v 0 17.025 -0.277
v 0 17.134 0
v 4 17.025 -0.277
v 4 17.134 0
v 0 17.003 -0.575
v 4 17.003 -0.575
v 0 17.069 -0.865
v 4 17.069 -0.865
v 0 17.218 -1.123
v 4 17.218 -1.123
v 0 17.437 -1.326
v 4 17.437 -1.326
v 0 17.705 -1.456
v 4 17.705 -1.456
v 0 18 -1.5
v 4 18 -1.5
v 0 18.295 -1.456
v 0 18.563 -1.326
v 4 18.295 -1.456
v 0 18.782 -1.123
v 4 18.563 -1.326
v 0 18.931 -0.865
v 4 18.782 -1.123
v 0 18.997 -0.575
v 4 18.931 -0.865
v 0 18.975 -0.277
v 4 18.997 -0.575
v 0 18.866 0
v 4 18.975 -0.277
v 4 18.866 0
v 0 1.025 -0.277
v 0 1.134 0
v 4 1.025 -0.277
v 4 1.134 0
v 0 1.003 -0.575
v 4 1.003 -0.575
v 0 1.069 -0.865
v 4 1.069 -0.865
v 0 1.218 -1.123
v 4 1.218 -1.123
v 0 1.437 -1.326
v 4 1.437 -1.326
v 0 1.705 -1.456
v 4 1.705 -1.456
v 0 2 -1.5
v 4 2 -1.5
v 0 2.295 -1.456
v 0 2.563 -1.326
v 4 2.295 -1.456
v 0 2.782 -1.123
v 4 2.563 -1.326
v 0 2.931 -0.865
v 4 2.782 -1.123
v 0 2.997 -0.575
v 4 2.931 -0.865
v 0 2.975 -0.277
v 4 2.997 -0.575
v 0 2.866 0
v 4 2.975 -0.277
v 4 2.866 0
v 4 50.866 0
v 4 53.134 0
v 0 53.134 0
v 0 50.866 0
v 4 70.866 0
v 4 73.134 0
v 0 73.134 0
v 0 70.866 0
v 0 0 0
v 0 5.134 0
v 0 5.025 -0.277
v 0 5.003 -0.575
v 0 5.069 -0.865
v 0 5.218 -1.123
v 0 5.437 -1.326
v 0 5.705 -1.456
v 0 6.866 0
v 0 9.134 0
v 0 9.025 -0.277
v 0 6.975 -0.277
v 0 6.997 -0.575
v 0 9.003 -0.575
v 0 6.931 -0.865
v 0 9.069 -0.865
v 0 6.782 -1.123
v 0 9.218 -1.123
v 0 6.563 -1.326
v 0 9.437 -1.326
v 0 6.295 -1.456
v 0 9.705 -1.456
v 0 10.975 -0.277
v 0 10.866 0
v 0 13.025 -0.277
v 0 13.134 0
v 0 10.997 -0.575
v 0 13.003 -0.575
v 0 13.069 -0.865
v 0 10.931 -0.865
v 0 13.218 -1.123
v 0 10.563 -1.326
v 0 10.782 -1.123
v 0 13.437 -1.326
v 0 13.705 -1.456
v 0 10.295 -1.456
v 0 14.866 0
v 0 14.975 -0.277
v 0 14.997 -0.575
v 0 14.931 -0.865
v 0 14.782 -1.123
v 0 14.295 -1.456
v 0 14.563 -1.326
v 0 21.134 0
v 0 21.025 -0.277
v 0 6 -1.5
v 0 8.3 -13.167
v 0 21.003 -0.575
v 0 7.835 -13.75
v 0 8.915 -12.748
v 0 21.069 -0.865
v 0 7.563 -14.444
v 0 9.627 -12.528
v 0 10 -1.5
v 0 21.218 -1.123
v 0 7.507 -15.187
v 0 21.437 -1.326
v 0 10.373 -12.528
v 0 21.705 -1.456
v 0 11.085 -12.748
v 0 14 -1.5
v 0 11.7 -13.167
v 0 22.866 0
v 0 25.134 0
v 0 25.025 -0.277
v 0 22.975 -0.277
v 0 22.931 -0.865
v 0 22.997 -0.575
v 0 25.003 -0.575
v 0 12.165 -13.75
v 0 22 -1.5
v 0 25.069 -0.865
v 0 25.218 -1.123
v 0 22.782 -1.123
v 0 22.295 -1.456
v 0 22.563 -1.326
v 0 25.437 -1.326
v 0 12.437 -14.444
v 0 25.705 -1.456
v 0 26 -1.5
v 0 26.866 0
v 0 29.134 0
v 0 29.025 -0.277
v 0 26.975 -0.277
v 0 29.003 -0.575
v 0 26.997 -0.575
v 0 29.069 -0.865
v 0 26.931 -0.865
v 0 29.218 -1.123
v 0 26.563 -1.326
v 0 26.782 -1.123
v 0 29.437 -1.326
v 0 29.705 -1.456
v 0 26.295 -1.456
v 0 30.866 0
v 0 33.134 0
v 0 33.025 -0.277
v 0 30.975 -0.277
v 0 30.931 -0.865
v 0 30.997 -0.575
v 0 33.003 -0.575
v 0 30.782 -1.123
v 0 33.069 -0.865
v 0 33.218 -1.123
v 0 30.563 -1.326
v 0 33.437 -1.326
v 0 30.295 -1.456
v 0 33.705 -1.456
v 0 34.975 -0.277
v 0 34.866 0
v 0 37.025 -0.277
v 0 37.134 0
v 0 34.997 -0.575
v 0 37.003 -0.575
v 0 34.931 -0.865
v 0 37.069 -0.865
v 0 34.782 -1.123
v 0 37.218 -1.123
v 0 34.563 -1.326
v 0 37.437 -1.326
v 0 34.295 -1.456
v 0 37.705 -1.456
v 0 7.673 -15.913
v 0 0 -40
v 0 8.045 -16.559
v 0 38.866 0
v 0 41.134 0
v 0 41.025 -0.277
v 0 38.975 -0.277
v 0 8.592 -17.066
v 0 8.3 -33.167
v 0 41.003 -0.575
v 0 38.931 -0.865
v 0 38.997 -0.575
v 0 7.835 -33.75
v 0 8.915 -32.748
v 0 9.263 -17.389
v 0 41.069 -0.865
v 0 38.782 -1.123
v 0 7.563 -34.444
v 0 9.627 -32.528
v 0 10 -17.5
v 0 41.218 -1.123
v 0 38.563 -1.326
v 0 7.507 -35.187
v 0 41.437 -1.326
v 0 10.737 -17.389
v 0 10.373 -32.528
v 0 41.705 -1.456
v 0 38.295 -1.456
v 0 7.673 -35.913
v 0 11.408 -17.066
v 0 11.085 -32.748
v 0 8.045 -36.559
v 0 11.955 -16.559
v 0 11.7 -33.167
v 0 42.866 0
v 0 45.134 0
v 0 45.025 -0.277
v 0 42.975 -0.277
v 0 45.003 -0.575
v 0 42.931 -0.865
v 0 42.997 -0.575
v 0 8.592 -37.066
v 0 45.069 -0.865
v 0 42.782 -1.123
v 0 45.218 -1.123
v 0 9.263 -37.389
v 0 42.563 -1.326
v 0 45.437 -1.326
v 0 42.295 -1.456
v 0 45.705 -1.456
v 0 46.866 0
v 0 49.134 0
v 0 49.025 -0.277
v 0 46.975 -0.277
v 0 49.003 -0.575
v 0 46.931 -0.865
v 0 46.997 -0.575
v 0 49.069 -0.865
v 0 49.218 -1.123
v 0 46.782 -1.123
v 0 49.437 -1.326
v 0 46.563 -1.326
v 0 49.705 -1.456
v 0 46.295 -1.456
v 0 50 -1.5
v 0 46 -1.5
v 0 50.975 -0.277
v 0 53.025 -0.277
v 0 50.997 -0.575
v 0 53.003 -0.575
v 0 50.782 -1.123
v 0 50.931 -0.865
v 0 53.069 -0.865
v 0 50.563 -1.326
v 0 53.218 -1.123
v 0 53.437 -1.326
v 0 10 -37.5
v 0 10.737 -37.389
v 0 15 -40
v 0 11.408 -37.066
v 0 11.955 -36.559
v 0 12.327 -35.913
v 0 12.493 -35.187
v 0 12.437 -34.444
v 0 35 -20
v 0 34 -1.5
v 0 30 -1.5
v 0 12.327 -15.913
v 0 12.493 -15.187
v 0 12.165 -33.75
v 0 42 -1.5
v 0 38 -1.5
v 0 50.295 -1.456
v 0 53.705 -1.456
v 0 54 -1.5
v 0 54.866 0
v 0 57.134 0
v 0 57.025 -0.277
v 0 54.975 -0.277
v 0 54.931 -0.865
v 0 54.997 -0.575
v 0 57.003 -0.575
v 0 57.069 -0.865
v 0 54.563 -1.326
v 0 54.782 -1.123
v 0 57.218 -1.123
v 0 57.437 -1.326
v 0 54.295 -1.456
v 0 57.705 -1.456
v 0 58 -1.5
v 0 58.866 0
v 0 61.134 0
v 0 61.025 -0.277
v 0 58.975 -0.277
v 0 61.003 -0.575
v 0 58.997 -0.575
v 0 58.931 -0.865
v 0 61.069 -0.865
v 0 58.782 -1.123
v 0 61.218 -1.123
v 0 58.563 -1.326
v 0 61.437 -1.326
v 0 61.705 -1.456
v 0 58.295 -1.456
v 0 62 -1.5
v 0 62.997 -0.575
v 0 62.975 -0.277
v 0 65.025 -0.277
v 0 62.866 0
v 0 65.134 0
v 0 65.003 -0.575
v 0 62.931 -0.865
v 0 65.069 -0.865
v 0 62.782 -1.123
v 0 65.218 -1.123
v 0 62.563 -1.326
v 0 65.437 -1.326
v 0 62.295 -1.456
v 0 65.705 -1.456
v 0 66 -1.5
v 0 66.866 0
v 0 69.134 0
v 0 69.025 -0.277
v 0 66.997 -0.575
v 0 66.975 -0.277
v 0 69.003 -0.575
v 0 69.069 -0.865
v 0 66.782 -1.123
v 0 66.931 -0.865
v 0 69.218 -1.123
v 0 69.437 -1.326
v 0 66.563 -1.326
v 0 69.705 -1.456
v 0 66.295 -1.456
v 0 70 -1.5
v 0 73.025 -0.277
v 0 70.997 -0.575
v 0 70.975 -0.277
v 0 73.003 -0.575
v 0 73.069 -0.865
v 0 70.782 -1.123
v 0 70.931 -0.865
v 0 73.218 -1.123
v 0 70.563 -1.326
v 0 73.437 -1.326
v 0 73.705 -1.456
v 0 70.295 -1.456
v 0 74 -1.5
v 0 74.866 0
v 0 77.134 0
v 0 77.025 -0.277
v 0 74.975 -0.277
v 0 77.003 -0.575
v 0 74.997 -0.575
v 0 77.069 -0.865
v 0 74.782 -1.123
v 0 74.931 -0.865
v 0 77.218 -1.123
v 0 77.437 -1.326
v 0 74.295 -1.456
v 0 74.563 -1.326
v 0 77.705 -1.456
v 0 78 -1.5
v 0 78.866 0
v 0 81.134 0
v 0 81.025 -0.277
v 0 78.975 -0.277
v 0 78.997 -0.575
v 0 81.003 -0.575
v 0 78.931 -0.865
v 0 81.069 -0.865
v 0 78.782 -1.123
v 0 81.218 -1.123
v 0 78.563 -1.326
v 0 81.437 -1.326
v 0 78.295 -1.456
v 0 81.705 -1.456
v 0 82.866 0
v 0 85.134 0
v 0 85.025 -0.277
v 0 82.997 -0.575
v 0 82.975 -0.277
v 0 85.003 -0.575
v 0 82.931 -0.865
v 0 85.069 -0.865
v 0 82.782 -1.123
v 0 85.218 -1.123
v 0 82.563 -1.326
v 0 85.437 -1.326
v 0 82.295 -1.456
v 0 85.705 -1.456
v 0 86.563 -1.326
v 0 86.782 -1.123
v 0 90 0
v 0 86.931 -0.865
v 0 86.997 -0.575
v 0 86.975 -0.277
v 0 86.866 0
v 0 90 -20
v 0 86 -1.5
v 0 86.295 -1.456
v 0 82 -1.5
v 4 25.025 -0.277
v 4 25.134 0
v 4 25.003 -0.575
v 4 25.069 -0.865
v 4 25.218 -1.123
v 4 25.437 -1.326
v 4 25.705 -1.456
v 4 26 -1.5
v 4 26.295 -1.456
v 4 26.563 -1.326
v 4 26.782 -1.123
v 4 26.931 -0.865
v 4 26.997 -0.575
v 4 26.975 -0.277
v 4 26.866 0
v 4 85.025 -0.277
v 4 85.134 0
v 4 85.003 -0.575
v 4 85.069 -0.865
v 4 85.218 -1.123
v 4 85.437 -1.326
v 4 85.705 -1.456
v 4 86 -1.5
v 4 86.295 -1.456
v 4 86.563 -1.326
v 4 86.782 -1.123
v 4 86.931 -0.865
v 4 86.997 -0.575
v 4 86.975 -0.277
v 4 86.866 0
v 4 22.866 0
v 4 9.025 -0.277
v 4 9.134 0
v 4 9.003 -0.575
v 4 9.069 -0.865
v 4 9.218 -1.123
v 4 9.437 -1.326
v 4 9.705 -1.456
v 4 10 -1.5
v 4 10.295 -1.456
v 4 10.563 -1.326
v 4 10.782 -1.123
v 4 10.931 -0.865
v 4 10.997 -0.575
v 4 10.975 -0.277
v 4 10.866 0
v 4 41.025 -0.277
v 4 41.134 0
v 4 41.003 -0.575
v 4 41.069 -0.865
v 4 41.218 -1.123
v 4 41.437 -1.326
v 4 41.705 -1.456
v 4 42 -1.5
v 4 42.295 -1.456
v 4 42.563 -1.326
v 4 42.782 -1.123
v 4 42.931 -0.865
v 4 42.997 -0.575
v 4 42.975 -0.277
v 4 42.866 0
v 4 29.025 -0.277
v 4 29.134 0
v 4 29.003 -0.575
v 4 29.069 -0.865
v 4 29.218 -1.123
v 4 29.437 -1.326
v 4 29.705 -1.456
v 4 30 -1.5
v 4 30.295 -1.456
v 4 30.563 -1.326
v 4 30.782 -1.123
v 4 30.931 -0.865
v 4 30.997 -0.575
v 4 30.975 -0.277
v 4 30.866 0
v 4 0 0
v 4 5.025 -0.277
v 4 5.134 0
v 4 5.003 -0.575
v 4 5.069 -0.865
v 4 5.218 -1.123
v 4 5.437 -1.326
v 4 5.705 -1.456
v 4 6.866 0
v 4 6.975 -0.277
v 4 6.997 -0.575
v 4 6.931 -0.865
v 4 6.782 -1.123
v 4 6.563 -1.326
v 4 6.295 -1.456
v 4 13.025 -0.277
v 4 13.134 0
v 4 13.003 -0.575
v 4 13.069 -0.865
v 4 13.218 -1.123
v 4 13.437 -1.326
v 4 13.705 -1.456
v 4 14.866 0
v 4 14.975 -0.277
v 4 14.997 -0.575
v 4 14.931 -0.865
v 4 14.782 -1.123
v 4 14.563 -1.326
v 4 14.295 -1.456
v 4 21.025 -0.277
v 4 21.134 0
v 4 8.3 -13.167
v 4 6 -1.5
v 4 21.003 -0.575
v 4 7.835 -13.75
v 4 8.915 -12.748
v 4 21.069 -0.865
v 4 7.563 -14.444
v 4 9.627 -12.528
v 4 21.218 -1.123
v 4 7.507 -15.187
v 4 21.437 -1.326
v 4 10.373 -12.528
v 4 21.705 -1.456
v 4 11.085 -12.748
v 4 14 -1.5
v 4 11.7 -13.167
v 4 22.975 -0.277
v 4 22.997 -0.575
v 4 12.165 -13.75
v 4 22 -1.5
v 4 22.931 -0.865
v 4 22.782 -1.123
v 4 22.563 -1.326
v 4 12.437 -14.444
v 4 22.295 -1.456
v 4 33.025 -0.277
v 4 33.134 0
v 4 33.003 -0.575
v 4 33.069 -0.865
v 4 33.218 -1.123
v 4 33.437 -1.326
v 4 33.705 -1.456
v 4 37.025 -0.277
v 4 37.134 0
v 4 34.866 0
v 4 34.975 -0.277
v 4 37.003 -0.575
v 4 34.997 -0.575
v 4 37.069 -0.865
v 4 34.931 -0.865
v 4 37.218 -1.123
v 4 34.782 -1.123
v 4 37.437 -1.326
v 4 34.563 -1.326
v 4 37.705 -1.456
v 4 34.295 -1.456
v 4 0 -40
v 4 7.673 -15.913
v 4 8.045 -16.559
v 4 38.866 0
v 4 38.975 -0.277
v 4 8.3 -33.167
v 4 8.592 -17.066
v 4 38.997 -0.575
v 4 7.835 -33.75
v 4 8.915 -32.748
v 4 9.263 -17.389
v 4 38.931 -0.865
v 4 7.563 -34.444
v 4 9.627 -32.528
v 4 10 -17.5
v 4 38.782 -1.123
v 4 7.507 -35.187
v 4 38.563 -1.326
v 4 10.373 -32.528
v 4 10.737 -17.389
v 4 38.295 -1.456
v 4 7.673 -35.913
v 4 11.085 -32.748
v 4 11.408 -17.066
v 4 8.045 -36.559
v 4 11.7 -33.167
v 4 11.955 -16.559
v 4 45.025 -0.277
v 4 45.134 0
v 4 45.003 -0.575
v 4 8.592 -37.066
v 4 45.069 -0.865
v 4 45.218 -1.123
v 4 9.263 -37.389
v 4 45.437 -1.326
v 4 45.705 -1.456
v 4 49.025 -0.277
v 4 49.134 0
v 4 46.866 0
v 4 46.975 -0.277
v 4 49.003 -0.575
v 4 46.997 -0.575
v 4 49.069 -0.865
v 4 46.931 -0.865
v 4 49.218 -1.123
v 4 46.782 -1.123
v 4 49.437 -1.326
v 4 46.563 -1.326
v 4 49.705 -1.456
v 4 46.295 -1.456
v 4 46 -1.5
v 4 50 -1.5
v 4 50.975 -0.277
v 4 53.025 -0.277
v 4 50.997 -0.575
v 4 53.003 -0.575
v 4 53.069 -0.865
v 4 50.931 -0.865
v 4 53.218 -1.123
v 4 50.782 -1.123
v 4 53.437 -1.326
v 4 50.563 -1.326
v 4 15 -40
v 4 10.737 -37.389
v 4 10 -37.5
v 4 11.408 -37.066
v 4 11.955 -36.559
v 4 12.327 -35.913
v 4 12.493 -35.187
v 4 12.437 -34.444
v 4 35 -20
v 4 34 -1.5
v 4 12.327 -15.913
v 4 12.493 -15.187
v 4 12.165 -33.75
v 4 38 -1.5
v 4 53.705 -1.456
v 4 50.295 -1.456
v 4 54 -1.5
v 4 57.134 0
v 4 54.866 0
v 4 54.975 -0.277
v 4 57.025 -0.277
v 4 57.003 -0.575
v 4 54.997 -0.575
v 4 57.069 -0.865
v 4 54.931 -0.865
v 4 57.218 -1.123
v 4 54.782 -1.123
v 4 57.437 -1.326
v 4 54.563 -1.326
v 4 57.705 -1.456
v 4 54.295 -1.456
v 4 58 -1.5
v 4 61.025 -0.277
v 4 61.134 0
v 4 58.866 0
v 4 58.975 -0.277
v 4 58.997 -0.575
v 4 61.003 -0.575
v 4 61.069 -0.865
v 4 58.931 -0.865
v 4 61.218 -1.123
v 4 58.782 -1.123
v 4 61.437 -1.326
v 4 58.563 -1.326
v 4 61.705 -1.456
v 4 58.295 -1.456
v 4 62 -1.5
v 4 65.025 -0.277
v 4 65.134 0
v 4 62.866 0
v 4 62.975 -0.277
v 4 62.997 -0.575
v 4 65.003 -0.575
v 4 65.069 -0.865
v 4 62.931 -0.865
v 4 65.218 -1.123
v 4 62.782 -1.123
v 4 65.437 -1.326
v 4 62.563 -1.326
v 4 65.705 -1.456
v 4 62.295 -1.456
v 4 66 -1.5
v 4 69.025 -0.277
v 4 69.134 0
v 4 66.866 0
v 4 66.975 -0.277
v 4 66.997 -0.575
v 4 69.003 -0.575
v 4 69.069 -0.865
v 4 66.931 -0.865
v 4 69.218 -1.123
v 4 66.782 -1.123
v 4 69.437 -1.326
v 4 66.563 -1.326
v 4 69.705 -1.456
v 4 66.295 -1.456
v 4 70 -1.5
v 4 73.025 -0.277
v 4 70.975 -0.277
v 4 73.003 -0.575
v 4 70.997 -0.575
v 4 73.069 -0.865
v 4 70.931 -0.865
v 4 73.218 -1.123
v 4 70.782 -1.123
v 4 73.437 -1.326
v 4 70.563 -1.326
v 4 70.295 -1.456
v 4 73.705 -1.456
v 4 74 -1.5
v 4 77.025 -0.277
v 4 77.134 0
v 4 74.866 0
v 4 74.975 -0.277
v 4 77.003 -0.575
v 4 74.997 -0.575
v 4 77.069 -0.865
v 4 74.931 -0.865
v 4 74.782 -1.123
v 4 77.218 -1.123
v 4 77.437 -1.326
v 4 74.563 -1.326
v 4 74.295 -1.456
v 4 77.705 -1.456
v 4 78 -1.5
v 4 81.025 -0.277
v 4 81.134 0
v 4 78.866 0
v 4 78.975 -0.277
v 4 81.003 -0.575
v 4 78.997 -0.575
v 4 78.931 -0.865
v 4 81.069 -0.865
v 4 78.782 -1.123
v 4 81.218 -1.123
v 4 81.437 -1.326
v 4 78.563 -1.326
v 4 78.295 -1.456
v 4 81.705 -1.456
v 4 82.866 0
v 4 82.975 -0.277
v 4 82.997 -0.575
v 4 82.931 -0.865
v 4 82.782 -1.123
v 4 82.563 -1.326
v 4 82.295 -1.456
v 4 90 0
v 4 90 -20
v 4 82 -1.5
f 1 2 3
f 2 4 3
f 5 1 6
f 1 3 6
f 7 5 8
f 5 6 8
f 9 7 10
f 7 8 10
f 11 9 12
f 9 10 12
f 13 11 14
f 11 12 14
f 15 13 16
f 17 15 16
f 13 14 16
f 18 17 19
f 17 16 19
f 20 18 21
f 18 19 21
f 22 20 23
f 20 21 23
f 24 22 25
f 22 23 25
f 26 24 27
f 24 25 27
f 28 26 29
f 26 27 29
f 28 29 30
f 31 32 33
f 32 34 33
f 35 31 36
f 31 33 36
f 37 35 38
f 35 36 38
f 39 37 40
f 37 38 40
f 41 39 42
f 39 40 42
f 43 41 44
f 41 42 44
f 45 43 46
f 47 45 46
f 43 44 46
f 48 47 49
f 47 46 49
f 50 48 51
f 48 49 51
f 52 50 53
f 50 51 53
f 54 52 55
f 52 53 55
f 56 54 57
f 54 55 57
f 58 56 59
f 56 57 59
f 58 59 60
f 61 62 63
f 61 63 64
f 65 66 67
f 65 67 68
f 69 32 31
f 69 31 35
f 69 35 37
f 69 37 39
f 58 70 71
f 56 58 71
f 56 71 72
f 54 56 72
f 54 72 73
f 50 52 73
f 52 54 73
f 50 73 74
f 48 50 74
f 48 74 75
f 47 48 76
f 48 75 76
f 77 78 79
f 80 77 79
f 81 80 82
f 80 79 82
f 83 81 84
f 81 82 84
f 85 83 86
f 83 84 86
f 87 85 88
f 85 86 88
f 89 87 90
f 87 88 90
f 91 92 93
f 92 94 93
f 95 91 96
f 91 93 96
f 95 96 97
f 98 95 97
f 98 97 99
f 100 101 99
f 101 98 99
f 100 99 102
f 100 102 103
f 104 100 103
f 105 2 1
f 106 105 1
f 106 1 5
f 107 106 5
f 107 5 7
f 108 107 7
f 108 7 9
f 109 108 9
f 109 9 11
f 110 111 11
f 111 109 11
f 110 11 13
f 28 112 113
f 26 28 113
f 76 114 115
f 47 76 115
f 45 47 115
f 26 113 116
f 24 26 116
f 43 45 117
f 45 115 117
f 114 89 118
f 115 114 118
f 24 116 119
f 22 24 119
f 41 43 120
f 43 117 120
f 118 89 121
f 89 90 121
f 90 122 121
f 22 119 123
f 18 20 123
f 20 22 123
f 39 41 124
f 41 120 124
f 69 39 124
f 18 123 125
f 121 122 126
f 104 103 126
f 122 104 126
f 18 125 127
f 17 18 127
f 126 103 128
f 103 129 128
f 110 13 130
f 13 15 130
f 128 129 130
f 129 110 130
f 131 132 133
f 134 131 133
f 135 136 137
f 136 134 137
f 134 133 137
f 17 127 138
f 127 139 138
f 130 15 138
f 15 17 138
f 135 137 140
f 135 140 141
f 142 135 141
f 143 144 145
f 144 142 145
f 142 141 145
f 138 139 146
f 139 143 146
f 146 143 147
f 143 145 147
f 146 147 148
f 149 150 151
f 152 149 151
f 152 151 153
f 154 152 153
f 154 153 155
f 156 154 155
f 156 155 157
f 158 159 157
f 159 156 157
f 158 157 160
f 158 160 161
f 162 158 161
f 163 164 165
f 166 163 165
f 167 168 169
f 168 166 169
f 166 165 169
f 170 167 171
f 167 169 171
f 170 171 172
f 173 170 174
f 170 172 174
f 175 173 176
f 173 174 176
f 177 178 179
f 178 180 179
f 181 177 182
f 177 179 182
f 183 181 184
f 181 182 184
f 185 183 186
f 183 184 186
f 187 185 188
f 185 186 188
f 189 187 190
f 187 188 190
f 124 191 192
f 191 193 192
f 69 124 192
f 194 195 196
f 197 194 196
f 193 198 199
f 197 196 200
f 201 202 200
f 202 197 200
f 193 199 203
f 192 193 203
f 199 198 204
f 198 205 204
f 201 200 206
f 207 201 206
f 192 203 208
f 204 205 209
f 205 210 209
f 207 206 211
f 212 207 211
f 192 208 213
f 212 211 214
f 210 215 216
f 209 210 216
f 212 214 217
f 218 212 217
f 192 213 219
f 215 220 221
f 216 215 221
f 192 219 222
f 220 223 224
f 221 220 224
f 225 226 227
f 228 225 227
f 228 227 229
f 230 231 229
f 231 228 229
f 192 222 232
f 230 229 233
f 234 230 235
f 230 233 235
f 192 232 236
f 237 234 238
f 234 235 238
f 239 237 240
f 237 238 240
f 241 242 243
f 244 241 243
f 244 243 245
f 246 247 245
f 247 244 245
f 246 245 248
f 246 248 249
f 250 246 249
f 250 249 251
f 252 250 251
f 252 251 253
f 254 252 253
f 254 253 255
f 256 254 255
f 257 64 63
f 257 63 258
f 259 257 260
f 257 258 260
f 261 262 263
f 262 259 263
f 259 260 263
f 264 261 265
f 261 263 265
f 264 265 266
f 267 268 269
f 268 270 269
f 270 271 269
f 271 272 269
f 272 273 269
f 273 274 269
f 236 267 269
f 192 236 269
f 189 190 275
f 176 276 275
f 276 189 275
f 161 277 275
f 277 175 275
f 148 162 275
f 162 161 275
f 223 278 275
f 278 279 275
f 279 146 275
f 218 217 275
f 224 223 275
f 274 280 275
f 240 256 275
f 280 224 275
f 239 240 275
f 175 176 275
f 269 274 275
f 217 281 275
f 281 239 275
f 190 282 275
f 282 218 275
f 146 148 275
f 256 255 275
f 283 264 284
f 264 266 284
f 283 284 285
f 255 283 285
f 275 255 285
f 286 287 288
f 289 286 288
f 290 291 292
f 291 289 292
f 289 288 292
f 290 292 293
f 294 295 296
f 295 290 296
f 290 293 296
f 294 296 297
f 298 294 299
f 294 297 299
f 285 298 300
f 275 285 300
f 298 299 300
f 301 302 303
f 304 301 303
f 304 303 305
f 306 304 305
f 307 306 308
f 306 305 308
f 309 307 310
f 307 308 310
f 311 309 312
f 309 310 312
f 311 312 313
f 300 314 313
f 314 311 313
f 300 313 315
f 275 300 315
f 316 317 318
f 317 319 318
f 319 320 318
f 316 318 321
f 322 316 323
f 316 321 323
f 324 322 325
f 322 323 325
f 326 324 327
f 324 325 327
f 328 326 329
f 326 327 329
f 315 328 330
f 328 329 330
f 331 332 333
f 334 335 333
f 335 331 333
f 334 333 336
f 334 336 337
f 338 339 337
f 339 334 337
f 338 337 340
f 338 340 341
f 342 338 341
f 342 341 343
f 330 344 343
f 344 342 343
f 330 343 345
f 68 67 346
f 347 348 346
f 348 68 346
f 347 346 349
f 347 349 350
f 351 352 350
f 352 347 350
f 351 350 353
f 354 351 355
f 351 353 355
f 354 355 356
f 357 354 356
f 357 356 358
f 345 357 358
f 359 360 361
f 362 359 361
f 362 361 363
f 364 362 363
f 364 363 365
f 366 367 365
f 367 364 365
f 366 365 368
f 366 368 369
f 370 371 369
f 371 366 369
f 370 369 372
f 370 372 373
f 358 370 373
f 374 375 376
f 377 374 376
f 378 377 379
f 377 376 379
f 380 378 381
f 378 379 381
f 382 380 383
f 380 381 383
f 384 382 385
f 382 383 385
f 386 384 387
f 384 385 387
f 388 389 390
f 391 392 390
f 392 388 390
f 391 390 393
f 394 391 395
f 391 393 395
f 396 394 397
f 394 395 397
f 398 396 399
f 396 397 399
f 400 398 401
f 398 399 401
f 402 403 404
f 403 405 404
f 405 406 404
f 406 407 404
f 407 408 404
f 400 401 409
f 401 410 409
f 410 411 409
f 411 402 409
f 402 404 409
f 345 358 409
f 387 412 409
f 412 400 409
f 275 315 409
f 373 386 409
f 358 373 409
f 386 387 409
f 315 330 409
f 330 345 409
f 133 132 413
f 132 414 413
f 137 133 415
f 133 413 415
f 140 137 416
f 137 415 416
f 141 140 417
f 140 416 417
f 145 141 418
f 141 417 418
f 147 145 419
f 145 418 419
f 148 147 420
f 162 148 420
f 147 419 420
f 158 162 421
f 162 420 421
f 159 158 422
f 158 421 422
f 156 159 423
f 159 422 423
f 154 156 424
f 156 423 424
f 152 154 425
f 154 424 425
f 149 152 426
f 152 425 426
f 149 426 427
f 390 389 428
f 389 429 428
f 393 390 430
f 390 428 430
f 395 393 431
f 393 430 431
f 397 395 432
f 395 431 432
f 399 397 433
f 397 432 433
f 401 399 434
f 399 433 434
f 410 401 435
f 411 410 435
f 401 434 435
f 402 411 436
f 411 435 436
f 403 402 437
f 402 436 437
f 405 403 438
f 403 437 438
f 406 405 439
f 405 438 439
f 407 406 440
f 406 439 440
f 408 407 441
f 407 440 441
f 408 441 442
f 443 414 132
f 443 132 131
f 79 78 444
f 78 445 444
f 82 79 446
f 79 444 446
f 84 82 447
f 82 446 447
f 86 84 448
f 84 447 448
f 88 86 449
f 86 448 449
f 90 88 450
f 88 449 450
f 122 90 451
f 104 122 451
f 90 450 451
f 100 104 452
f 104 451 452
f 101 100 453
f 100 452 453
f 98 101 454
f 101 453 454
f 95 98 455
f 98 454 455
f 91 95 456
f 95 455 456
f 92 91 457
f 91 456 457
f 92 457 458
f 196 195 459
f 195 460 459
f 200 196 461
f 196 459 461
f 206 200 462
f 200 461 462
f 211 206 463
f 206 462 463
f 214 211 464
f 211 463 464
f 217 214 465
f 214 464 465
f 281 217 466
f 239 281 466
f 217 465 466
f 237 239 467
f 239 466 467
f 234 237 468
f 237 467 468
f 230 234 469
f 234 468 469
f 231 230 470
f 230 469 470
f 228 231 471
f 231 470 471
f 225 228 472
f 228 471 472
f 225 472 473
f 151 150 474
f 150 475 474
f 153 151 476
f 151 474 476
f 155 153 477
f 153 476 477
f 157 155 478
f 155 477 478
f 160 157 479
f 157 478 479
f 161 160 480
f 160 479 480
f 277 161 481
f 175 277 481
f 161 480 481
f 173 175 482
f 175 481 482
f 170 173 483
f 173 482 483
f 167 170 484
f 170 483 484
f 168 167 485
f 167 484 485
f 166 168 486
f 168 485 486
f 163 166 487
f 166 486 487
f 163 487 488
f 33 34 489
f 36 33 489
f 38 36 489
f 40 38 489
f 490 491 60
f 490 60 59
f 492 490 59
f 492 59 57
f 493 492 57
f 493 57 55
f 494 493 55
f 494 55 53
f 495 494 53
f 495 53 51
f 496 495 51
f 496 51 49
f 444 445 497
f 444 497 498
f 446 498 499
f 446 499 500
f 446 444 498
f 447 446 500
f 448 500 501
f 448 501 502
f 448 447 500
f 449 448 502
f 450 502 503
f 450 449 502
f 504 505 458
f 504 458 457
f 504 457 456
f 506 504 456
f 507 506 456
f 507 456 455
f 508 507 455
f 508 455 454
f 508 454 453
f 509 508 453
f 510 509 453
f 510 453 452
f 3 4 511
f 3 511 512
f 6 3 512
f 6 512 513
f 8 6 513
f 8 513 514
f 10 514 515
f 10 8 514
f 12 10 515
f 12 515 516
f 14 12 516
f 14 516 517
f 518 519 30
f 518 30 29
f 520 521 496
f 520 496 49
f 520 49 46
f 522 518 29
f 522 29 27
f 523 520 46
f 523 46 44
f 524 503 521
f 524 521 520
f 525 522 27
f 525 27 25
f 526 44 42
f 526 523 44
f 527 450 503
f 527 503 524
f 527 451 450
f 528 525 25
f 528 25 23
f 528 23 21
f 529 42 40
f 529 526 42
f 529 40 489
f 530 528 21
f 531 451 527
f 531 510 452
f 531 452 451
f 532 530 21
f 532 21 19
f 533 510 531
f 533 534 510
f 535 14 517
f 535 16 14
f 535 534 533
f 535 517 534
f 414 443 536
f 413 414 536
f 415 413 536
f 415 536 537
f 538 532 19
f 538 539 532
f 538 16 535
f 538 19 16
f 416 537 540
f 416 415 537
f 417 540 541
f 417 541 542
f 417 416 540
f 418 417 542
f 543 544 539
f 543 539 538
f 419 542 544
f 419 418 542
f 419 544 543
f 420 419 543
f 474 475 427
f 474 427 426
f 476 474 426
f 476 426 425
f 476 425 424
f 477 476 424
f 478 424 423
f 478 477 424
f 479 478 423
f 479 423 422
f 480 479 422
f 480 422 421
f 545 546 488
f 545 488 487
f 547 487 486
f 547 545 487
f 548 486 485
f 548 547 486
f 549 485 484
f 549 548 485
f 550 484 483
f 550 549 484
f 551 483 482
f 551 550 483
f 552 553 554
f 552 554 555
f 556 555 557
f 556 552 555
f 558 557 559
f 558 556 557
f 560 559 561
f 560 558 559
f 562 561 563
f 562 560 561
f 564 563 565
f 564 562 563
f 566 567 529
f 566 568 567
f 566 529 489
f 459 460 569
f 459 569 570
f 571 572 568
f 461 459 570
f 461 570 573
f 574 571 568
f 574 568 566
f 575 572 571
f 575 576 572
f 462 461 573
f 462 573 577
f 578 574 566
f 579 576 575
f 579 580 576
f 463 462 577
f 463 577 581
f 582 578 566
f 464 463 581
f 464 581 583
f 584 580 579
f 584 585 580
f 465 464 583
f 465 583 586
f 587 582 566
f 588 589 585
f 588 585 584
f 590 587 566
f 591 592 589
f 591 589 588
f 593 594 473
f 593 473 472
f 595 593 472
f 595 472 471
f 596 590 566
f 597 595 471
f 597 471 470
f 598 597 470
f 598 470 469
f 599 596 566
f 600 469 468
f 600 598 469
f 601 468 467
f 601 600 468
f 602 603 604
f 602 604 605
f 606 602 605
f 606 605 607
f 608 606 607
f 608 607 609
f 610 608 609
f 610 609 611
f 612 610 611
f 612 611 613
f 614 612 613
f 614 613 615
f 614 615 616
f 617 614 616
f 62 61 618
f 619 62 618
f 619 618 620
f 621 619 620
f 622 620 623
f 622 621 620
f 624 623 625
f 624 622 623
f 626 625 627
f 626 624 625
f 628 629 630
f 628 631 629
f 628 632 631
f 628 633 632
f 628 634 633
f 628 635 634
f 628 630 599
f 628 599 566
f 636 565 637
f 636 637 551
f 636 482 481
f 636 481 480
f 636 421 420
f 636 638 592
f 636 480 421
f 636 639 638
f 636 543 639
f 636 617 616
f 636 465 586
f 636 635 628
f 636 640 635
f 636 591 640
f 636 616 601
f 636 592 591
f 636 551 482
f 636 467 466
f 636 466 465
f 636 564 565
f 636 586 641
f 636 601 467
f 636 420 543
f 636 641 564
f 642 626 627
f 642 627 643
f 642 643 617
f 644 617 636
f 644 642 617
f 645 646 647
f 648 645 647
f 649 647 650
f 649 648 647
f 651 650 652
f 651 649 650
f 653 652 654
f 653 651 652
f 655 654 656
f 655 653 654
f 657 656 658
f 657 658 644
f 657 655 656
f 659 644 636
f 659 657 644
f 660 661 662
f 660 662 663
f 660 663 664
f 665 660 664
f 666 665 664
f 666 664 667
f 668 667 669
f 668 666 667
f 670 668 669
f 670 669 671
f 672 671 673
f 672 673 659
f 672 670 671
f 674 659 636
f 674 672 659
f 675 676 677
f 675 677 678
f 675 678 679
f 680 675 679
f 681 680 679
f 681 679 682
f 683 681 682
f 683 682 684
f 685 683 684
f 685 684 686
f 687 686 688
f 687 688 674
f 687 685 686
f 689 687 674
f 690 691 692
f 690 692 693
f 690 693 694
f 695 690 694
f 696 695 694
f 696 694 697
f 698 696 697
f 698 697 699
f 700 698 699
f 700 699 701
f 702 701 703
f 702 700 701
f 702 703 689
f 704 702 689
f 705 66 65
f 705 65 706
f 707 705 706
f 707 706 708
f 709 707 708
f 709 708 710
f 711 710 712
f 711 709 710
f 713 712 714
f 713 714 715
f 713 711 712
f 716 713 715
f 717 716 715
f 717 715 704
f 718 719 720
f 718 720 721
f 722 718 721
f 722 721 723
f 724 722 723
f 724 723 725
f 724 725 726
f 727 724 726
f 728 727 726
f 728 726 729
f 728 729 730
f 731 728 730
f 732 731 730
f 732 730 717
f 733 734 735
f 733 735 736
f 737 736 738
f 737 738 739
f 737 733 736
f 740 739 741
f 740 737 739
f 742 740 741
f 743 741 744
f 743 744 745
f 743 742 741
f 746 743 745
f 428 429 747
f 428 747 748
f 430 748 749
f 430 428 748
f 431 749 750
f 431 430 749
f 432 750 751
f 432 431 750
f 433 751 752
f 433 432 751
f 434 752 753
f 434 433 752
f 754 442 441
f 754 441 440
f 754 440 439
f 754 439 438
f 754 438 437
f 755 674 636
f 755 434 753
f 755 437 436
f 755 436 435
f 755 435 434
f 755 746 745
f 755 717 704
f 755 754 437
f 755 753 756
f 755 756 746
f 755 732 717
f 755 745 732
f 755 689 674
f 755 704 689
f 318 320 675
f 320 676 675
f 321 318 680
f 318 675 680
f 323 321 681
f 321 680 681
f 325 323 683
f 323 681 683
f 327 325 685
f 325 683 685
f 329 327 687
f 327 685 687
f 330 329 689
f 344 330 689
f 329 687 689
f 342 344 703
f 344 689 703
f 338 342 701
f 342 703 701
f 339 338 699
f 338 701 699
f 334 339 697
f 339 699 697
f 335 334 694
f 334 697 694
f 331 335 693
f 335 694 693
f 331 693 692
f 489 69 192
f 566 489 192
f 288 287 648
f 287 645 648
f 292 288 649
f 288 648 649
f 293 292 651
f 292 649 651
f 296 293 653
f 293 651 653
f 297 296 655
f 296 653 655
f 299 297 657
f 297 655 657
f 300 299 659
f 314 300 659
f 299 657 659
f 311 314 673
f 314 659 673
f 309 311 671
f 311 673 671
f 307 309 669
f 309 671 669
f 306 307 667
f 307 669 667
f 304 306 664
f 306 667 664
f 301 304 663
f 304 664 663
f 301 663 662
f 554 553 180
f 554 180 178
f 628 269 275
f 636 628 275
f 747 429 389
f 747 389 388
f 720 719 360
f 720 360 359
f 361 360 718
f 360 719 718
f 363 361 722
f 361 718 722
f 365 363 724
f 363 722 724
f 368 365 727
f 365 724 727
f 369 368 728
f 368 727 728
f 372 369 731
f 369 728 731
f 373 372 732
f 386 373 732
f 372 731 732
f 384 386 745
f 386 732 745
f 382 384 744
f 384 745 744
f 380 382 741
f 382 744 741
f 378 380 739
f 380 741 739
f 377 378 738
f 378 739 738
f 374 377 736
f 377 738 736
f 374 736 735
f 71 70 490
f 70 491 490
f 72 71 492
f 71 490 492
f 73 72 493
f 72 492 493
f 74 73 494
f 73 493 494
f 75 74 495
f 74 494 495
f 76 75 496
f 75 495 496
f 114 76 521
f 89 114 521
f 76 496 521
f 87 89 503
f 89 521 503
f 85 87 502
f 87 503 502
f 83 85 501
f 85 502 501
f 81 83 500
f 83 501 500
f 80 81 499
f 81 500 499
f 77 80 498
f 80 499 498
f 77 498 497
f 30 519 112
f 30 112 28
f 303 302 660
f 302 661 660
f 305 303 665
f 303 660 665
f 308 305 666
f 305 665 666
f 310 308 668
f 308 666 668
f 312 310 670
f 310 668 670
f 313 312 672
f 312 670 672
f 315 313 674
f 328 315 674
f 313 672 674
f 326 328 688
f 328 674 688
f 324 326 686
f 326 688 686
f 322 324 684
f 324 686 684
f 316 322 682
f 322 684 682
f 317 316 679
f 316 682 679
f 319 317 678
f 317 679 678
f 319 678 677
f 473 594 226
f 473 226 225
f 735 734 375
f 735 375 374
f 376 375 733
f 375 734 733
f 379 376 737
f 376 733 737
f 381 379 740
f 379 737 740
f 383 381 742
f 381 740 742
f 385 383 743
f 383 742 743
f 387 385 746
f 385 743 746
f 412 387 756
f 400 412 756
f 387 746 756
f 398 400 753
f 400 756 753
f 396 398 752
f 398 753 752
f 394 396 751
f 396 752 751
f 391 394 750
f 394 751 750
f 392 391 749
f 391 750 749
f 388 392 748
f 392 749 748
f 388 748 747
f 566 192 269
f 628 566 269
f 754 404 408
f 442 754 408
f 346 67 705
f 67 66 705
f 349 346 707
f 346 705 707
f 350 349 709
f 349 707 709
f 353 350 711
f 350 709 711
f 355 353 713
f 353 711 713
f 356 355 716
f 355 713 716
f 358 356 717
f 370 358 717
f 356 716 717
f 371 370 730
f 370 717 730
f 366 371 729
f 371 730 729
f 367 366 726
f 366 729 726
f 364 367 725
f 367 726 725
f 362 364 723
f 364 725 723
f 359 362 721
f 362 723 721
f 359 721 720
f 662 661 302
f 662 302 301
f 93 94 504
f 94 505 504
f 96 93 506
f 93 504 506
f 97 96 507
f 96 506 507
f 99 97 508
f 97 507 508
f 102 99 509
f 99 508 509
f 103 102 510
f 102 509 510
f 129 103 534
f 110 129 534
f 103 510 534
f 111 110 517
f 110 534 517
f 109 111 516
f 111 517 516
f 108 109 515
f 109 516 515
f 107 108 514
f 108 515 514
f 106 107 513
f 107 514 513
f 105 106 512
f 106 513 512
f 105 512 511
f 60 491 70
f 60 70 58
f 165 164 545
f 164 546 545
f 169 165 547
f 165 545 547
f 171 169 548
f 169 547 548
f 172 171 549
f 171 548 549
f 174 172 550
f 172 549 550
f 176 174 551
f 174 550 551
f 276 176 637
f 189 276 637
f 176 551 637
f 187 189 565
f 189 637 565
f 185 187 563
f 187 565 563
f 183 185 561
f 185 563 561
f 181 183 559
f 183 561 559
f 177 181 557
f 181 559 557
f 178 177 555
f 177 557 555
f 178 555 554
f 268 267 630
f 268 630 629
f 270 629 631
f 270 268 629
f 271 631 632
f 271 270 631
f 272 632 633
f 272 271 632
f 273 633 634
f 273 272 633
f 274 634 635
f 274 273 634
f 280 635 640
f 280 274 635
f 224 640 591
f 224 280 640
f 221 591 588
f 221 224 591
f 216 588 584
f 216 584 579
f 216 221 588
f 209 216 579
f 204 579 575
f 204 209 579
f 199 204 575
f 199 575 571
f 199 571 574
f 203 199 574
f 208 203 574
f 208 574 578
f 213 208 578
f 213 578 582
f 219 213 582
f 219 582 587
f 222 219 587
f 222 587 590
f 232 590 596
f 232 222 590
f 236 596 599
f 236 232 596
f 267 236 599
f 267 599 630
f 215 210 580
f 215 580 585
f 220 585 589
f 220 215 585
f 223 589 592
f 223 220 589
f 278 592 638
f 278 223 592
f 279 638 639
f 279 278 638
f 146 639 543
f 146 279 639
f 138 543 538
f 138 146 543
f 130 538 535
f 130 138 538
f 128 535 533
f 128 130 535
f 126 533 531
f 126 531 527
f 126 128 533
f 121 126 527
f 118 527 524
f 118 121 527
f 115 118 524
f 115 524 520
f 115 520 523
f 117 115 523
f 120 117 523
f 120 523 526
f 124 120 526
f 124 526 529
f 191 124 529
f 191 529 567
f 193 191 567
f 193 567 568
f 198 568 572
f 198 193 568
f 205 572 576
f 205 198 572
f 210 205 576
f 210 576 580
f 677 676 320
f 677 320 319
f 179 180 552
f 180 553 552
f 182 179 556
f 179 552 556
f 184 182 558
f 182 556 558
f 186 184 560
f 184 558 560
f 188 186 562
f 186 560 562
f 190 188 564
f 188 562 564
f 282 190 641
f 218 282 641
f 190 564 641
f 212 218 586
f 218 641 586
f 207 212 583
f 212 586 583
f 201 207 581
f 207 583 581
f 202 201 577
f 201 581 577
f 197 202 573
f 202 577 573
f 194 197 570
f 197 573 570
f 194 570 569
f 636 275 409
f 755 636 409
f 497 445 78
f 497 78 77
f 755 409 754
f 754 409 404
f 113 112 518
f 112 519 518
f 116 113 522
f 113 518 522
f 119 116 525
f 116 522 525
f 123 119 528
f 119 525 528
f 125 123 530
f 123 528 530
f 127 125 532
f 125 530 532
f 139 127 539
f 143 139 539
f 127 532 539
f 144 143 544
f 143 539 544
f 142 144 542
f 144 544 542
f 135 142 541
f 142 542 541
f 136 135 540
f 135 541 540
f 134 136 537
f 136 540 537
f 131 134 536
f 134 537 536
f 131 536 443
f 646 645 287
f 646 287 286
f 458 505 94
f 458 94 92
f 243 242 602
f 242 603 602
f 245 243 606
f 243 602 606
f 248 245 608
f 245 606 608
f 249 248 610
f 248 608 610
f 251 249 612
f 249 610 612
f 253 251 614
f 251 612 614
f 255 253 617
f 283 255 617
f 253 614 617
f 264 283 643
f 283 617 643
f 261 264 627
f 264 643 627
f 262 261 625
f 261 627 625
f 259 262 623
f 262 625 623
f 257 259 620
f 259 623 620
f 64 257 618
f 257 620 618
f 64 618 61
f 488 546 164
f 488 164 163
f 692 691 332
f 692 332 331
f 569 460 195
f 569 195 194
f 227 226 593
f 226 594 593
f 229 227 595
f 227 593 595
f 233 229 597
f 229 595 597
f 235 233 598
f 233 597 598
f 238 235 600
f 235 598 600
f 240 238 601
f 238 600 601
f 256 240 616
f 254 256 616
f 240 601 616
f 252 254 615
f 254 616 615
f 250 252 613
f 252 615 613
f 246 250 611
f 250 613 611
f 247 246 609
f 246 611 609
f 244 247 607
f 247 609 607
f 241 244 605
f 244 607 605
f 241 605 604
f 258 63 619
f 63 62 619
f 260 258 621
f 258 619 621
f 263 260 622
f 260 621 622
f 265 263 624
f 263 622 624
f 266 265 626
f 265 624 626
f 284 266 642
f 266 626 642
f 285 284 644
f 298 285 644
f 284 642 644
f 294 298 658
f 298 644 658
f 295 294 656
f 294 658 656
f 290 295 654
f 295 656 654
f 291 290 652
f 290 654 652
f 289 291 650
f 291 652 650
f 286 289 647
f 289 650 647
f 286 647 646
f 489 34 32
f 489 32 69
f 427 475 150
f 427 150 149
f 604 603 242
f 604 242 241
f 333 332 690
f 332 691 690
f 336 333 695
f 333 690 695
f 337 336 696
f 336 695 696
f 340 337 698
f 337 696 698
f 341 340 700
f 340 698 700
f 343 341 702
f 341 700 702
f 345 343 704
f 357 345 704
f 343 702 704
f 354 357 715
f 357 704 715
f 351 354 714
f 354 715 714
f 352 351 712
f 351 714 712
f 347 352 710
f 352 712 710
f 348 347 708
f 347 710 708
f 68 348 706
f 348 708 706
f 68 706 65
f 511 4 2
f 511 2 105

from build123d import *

# Parameters (mm, degrees)
SKETCH_1_R          = 2.5
EXTRUDE_1_DEPTH     = 4
SKETCH_2_R          = 1
CUT_EXTRUDE_1_DEPTH = 10


with BuildPart() as part:
    # Эскиз1 → Бобышка-Вытянуть1 (new body)
    with BuildSketch(Plane(origin=(0, 0, 0), x_dir=(0, 0, -1), z_dir=(1, 0, 0))):
        Polygon((40, 15), (20, 35), (20, 90), (0, 90), (0, 0), (40, 0), align=None)
        with Locations((15, 10)):
            Circle(SKETCH_1_R, mode=Mode.SUBTRACT)
        with Locations((35, 10)):
            Circle(SKETCH_1_R, mode=Mode.SUBTRACT)
    extrude(amount=EXTRUDE_1_DEPTH)

    # Эскиз2 → Вырез-Вытянуть1 (cut)
    with BuildSketch(Plane(origin=(4, 0, 0), x_dir=(0, 0, -1), z_dir=(1, 0, 0))):
        with Locations((0.5, 2)):
            Circle(SKETCH_2_R)
        with Locations((0.5, 6)):
            Circle(SKETCH_2_R)
        with Locations((0.5, 10)):
            Circle(SKETCH_2_R)
        with Locations((0.5, 14)):
            Circle(SKETCH_2_R)
        with Locations((0.5, 18)):
            Circle(SKETCH_2_R)
        with Locations((0.5, 22)):
            Circle(SKETCH_2_R)
        with Locations((0.5, 26)):
            Circle(SKETCH_2_R)
        with Locations((0.5, 30)):
            Circle(SKETCH_2_R)
        with Locations((0.5, 34)):
            Circle(SKETCH_2_R)
        with Locations((0.5, 38)):
            Circle(SKETCH_2_R)
        with Locations((0.5, 42)):
            Circle(SKETCH_2_R)
        with Locations((0.5, 46)):
            Circle(SKETCH_2_R)
        with Locations((0.5, 50)):
            Circle(SKETCH_2_R)
        with Locations((0.5, 54)):
            Circle(SKETCH_2_R)
        with Locations((0.5, 58)):
            Circle(SKETCH_2_R)
        with Locations((0.5, 62)):
            Circle(SKETCH_2_R)
        with Locations((0.5, 66)):
            Circle(SKETCH_2_R)
        with Locations((0.5, 70)):
            Circle(SKETCH_2_R)
        with Locations((0.5, 74)):
            Circle(SKETCH_2_R)
        with Locations((0.5, 78)):
            Circle(SKETCH_2_R)
        with Locations((0.5, 82)):
            Circle(SKETCH_2_R)
        with Locations((0.5, 86)):
            Circle(SKETCH_2_R)
    extrude(amount=-CUT_EXTRUDE_1_DEPTH, mode=Mode.SUBTRACT)


solid = part.part
